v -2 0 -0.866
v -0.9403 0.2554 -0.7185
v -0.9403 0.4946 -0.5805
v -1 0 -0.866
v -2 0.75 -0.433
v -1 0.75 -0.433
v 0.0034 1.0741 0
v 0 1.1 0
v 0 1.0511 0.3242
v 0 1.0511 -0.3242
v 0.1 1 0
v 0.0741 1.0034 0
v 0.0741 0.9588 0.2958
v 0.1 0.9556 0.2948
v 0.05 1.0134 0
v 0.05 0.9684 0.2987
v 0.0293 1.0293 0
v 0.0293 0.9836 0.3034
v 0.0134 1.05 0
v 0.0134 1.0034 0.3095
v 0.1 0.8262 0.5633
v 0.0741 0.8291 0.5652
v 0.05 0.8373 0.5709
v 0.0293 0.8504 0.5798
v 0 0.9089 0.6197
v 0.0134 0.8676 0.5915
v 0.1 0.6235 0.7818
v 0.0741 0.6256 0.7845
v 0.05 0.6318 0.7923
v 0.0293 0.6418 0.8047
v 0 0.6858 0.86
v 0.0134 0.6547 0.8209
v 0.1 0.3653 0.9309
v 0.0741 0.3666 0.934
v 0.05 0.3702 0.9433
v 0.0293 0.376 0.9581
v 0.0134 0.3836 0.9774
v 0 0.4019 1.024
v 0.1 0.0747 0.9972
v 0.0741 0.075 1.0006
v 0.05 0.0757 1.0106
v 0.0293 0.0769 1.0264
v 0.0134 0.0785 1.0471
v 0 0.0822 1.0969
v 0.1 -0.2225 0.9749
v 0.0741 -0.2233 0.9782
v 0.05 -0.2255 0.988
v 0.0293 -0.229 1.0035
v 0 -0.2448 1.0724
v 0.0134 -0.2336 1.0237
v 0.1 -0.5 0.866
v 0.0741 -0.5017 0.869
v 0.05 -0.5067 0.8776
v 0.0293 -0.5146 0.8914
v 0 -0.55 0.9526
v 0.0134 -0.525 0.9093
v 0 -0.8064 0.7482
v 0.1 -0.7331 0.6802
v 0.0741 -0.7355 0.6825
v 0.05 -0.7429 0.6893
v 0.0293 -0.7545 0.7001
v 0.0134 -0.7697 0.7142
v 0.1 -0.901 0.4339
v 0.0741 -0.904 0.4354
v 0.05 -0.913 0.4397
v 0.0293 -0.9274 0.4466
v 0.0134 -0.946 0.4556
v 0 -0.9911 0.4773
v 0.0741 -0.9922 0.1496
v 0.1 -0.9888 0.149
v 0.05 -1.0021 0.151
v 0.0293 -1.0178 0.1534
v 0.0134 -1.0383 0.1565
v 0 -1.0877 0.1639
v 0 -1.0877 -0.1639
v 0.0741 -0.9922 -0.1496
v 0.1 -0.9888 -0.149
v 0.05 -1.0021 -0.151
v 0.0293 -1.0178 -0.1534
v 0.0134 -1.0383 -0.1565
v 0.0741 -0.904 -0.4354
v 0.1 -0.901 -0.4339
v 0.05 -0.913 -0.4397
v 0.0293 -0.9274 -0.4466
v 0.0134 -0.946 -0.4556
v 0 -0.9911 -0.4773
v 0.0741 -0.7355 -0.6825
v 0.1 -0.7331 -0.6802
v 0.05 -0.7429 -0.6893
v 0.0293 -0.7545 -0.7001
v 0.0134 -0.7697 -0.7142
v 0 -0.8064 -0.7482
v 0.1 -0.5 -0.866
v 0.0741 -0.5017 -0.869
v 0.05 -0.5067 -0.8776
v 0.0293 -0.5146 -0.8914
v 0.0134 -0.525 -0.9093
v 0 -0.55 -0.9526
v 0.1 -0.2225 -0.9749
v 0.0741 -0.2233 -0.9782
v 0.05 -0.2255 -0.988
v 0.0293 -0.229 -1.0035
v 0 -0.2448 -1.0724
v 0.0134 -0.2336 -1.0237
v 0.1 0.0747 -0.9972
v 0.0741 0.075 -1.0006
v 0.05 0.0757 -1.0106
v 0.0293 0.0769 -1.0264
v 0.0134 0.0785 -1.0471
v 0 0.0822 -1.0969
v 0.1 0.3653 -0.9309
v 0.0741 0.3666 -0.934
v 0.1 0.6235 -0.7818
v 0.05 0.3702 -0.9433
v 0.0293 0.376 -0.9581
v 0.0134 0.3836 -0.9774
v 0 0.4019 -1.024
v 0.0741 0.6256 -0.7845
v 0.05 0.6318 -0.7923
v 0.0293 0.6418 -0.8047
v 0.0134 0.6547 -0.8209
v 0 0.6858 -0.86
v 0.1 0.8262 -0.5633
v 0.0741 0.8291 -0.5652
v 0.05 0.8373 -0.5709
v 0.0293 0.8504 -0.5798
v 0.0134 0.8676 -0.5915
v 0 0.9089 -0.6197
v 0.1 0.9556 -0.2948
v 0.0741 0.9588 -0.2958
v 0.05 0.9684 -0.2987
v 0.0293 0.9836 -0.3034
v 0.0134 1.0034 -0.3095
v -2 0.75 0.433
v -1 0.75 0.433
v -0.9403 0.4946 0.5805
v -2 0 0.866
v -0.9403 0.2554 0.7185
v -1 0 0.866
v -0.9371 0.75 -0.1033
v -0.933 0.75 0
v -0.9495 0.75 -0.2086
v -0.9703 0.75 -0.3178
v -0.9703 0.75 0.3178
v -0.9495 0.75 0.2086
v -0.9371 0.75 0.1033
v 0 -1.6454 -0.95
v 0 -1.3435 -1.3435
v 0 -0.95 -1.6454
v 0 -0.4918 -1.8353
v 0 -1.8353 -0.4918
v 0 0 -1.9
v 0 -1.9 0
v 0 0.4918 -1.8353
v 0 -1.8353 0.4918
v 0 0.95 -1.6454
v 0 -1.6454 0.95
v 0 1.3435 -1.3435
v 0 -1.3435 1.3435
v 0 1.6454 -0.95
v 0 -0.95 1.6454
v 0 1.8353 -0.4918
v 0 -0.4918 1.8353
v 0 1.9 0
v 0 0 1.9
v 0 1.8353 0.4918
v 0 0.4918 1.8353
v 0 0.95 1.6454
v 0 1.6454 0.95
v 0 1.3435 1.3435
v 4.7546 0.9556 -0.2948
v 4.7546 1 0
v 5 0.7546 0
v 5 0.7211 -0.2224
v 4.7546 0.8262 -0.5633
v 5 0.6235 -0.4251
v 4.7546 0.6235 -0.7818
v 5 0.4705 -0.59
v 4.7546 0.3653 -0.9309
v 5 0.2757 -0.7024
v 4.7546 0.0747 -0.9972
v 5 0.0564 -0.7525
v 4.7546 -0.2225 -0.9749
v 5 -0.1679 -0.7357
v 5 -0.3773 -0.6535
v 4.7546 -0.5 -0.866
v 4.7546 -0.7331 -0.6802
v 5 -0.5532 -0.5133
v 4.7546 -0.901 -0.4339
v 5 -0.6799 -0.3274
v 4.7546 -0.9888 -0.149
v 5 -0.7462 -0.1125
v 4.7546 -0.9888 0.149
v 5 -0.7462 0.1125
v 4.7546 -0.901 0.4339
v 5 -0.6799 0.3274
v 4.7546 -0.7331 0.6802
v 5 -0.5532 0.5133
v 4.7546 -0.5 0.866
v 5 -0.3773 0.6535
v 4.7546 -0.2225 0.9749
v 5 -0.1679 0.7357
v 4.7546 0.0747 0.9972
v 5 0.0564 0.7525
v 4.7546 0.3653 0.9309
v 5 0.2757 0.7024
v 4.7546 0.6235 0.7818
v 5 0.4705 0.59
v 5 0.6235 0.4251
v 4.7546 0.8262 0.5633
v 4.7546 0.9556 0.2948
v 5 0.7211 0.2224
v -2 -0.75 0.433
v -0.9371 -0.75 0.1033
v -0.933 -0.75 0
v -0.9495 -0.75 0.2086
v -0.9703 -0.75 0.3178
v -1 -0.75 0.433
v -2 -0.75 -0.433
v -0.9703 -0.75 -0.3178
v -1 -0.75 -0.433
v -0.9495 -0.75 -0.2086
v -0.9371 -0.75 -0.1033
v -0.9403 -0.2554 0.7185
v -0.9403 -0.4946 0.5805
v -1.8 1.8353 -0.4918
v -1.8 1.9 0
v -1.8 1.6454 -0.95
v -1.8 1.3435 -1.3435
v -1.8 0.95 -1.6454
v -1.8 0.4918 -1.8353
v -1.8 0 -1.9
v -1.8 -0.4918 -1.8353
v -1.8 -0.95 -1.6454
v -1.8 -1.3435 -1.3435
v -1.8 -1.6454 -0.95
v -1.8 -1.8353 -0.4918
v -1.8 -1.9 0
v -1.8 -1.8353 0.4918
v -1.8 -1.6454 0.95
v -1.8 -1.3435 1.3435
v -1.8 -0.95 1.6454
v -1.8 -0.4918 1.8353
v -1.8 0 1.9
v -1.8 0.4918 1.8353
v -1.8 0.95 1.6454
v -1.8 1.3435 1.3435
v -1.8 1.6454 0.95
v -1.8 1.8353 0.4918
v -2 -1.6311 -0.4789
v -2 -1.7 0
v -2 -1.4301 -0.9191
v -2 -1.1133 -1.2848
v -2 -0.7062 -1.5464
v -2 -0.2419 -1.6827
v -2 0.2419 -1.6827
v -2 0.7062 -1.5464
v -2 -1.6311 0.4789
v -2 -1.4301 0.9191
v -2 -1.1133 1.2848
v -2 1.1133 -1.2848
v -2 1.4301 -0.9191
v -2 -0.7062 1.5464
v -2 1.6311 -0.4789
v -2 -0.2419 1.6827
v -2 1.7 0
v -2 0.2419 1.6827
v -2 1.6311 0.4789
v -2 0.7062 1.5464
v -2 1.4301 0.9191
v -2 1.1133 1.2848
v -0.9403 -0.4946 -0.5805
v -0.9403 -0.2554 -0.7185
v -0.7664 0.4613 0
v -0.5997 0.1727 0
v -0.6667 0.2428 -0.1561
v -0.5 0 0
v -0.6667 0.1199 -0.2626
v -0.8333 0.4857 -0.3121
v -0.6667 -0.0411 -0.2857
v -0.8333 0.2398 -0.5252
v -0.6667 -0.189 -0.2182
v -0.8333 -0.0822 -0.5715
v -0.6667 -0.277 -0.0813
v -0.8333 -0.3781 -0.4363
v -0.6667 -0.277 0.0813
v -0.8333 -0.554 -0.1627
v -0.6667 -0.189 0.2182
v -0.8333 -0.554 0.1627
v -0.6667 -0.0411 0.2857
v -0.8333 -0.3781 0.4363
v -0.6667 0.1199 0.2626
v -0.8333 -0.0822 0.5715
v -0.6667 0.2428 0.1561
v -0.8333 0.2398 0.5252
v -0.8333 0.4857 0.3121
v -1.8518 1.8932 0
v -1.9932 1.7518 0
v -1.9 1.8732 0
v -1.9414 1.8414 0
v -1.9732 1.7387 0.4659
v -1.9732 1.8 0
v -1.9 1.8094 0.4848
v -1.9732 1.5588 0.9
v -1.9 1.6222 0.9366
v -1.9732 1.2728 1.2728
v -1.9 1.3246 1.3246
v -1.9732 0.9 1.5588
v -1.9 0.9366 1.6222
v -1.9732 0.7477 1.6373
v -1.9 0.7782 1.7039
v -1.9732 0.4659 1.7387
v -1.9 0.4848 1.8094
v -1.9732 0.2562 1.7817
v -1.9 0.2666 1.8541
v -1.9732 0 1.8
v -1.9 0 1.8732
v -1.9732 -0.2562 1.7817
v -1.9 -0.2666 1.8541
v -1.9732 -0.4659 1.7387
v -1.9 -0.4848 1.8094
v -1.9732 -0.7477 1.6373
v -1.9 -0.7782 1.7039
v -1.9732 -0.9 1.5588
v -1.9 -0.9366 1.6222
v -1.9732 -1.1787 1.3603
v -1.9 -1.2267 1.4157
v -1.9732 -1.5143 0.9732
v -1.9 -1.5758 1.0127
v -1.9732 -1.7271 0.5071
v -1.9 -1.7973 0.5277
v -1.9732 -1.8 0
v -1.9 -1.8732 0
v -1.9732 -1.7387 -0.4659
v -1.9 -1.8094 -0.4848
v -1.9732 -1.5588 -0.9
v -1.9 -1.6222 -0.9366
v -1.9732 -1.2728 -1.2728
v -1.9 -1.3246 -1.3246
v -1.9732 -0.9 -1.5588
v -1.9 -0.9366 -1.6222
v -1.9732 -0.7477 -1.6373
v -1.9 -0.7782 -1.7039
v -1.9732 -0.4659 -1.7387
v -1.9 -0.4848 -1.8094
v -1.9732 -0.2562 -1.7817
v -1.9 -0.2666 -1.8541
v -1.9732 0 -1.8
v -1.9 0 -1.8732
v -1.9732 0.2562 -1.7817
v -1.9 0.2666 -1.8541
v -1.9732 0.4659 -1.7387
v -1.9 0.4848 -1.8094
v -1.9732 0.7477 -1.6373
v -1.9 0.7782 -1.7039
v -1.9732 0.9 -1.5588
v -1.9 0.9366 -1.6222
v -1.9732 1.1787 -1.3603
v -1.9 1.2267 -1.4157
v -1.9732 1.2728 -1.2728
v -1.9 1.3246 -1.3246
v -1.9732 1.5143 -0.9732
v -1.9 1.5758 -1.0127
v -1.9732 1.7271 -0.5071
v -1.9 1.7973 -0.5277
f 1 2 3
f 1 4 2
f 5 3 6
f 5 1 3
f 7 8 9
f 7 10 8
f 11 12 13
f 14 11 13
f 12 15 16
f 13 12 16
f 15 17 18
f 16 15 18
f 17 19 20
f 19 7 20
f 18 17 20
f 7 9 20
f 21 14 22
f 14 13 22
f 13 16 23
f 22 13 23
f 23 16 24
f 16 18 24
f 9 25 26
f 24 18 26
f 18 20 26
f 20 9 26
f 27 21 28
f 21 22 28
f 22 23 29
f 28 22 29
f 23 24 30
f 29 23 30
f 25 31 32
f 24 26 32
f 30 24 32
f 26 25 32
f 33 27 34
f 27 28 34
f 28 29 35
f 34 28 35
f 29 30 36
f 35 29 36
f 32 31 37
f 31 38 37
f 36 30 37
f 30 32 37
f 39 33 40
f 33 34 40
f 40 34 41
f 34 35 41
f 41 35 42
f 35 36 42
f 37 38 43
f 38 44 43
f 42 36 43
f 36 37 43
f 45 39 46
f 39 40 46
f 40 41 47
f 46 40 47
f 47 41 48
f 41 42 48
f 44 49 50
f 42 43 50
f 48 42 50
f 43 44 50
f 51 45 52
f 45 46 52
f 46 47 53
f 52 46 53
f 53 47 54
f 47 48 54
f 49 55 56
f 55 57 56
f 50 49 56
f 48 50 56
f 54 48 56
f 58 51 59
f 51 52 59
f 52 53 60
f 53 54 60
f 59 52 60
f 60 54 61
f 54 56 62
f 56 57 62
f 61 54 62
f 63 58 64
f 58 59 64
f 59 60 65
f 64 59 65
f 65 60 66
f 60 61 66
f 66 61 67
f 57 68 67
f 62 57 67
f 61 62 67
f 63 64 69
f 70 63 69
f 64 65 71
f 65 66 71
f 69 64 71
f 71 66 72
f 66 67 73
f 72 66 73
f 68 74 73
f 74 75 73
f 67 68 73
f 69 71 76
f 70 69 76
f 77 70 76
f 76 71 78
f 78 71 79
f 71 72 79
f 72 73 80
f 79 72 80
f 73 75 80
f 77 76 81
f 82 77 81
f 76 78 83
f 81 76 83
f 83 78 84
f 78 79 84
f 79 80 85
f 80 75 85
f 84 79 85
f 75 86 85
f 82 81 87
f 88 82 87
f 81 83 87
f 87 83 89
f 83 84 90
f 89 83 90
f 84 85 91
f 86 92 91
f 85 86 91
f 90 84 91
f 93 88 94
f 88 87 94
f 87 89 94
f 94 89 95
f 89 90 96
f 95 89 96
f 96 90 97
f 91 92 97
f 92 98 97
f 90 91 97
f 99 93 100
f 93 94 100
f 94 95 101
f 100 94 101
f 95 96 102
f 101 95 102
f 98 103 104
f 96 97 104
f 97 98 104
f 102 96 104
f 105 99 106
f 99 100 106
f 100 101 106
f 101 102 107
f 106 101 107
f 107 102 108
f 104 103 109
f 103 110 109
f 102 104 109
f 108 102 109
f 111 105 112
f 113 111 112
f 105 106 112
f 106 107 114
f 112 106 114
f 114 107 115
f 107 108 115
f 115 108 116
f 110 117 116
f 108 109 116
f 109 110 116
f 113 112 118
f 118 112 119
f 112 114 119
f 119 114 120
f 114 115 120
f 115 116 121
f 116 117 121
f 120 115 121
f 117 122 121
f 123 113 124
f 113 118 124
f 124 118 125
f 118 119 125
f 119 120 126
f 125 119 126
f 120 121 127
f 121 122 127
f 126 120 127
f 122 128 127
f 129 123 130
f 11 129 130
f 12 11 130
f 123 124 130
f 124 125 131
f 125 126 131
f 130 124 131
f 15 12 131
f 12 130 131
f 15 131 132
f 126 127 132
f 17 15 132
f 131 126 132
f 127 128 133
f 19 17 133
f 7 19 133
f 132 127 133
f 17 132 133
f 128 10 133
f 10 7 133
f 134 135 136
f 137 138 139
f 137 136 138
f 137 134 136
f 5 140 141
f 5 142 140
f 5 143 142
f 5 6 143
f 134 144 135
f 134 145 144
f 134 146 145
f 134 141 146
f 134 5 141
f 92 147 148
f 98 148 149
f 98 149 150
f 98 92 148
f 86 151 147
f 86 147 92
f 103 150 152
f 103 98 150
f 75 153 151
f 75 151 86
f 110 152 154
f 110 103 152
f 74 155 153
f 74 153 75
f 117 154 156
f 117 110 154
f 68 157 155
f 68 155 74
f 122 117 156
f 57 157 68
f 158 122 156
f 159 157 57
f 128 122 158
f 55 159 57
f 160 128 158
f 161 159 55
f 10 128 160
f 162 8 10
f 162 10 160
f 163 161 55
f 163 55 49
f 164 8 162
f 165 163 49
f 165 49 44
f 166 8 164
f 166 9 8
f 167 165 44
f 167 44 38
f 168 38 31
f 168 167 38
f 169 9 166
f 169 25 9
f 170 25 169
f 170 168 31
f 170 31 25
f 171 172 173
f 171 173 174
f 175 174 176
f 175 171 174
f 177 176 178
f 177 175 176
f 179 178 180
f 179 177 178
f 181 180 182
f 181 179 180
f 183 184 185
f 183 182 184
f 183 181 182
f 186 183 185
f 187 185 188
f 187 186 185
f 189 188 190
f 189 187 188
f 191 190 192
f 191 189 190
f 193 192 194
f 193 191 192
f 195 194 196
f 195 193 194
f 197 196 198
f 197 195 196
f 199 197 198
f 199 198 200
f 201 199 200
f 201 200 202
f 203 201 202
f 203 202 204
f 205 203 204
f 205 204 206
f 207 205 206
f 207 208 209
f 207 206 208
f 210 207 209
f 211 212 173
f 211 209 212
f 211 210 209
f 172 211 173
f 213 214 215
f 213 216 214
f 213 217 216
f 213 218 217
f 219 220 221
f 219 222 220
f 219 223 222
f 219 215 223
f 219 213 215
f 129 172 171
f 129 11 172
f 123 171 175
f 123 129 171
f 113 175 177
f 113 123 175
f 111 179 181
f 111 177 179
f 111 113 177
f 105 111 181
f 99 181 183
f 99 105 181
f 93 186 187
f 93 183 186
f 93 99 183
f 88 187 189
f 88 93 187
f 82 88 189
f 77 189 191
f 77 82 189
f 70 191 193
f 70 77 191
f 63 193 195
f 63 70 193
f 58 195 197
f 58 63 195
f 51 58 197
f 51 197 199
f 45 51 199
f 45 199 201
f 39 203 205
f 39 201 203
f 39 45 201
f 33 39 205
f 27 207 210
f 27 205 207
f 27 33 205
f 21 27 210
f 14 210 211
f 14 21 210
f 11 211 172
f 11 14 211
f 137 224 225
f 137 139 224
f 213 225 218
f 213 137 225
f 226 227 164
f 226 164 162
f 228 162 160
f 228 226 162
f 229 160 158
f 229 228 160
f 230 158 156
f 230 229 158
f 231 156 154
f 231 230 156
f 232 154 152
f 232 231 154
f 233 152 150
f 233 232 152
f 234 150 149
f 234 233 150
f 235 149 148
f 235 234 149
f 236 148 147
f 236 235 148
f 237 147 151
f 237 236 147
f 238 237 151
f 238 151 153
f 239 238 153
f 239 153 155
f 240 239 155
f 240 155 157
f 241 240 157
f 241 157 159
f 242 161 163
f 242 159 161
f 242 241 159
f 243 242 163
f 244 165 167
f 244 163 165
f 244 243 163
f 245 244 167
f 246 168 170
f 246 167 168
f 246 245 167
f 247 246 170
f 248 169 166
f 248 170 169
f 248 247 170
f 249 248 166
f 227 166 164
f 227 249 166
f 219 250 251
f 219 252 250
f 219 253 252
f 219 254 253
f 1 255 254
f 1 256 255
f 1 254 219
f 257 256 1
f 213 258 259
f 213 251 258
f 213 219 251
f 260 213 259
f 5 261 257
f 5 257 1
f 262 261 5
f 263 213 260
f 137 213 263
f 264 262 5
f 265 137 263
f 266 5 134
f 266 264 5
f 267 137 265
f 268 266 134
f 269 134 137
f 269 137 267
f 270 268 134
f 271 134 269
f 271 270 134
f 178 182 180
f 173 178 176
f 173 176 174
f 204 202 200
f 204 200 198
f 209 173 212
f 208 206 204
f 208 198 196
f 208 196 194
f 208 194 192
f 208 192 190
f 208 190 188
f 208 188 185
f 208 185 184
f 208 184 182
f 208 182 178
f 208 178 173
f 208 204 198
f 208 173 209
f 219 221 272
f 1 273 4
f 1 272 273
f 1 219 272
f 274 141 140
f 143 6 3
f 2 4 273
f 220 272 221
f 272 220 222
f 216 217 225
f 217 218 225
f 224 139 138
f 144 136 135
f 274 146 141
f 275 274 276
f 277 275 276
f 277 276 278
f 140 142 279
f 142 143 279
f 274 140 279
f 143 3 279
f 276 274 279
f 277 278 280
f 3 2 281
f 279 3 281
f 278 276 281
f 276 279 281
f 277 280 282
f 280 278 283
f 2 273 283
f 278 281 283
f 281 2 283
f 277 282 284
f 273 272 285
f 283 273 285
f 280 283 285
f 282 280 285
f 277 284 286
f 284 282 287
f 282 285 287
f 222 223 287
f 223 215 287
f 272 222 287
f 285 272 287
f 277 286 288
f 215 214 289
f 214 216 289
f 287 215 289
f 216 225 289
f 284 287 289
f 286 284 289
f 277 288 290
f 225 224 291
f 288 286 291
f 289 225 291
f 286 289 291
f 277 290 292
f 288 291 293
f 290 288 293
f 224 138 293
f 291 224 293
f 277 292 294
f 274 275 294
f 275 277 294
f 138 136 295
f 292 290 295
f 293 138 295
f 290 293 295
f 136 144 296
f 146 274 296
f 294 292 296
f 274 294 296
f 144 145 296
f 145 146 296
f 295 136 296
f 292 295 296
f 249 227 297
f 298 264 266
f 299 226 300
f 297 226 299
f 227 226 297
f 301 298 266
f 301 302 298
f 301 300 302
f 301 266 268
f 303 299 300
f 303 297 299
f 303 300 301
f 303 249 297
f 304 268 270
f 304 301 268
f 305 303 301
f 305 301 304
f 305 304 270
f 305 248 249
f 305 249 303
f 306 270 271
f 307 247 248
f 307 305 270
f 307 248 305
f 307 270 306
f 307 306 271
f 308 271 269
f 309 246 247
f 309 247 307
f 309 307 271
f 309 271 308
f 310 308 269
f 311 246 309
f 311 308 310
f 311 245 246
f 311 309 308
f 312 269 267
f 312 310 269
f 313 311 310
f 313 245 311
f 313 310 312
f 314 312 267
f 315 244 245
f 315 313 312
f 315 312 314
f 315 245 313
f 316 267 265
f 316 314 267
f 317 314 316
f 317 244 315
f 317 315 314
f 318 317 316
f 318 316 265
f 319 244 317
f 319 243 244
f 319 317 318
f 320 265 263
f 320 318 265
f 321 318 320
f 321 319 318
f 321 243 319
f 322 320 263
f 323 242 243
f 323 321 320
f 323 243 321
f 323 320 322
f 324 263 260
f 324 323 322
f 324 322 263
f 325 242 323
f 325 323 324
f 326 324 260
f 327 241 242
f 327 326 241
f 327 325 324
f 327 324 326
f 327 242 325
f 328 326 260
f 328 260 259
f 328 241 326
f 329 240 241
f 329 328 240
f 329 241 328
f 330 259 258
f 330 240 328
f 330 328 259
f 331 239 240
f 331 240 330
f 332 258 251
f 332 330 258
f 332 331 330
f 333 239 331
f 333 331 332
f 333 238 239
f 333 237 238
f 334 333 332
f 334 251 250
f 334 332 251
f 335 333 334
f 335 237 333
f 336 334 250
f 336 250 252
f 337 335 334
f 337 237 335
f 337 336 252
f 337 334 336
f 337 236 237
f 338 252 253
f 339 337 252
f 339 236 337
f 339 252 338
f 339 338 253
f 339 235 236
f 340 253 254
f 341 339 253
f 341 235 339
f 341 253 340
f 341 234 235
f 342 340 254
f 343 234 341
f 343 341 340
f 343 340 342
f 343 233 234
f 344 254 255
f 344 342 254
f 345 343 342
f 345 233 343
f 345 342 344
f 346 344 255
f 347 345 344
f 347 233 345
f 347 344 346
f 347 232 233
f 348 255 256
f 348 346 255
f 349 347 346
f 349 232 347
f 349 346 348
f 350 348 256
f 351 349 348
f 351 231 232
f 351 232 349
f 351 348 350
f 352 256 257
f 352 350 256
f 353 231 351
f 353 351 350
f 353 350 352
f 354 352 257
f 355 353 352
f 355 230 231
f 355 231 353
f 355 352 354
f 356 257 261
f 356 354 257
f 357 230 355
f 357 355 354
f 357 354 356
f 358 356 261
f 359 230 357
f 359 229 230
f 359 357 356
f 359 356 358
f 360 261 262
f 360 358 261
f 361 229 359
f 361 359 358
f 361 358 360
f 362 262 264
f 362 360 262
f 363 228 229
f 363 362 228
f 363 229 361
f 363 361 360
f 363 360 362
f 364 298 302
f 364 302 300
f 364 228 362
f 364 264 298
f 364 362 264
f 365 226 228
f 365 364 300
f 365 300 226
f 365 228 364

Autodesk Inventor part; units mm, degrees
ref_plane "YZ Plane" through (0, 0, 0) normal (1, 0, 0) x (0, 1, 0)
ref_plane "XZ Plane" through (0, 0, 0) normal (0, 1, 0) x (-1, 0, 0)
sketch "Skizze1" plane through (0, 0, 0) normal (0, 0, 1) x (1, 0, 0)
  line L0 (-0.5, 0) -> (5, 0)
  line L1 (5, 0) -> (5, 1)
  line L2 (5, 1) -> (1, 1)
  line L3 (1, 1) -> (0.7545, 1)
  line L4 (0.7545, 1) -> (0, 1)
  line L5 (0, 1) -> (0, 1.9)
  line L6 (0, 1.9) -> (-2, 1.9)
  line L7 (-2, 1.9) -> (-2, 0.866)
  line L8 (-2, 0.866) -> (-1, 0.866)
  line L9 (-1, 0.866) -> (-0.5, 0)
  line L10 (-3.4, 0) -> (6.4, 0) projected
  line L11 (0, -0.38) -> (0, 2.28) projected
  line L12 (1, 1) -> (0, 1) construction
  dimension "d1" = 4
  dimension "d2" = 0.2455
  dimension "d3" = 2
  dimension "d4" = 1
  dimension "d5" = 60
  dimension "d6" = 2
  dimension "d7" = 2
  dimension "d8" = 1.7321
  dimension "d9" = 3.8
  dimension "d26" = 5
revolve "Körper" add sketch "Skizze1" angle 360 about axis through (-0.5, 0, 0) along (1, 0, 0)
sketch "Skizze2" plane through (-2, 0, 0) normal (-1, 0, 0) x (0, 0, 1)
  circle A0 centre (0, 0) radius 0.866 projected
  line L0 (0, -2.66) -> (0, 2.66) projected
  line L1 (-2.66, 0) -> (2.66, 0) projected
  line L2 (0.866, 0) -> (0.433, -0.75)
  line L3 (0.433, -0.75) -> (-0.433, -0.75)
  line L4 (-0.433, -0.75) -> (-0.866, 0)
  line L5 (-0.866, 0) -> (-0.433, 0.75)
  line L6 (-0.433, 0.75) -> (0.433, 0.75)
  line L7 (0.433, 0.75) -> (0.866, 0)
  point P0 (0, 0)
extrude "Loch" add sketch "Skizze2" against normal up to next contours L7 A0 | A0 L2 | L6 L0 A0 | A0 L0 L3 | L0 L6 A0 | A0 L3 L0 | L4 A0 | A0 L5
fillet "Rundung1" radius 0.2 1 edges at (-2, -1.9, 0)
thread "Gewinde" size "M2x0.4" class "6g" standard "ISO Metric profile" length 4
chamfer "Fase1" distance 0.2454 distance2 0.2454 1 edges at (5, -1, 0) measured on face at (5, -0.4588, -0.3309)
ref_plane "Work Plane1" through (29, 0, 0) normal (0, -1, 0) x (1, 0, 0)
fillet "Fillet2" radius 0.1 1 edges at (0, -1, 0)
equation "\"d1\" = GEL"
equation "\"d3\" = KOH"
equation "\"d4\" = INTI"
equation "\"d6\" = GD"
equation "\"d7\" = BDM"
equation "\"d8\" = 1.1547 * SW"
equation "\"d9\" = KOD"
equation "\"d26\" = NLG"
equation "\"d30\" = R"
equation "\"d17\" = RR"
equation "\"d13\" = GEL"
equation "\"d15\" = -0.5 * SPD + 0.5 * GD"
equation "\"d16\" = GUL"
equation "\"GD\" = 2"
equation "\"NLG\" = 5"
equation "\"GEL\" = 4"
equation "\"KOD\" = 3.8"
equation "\"KOH\" = 2"
equation "\"INTI\" = 1"
equation "\"GAL\" = 0.61345 * PTC"
equation "\"GUL\" = 0.61345 * PTC"
equation "\"BDM\" = NND"
equation "\"SW\" = 1.5"
equation "\"RR\" = 0.2"
equation "\"SPD\" = NND - 1.2269 * PTC"
equation "\"R\" = 0.1"
equation "\"TOA\" = 30deg"
equation "\"GD1\" = THREADDIA - 1.2269 * PTC"
equation "\"THREADDIA\" = 2"
equation "\"FAWI\" = 45deg"
equation "\"PTC\" = 0.4"
equation "\"NND\" = 2"
equation "\"E0\" = 1.155 * SW"
properties part number "ISO 4762 - M2 x 5" material "Edelstahl, 440C"
